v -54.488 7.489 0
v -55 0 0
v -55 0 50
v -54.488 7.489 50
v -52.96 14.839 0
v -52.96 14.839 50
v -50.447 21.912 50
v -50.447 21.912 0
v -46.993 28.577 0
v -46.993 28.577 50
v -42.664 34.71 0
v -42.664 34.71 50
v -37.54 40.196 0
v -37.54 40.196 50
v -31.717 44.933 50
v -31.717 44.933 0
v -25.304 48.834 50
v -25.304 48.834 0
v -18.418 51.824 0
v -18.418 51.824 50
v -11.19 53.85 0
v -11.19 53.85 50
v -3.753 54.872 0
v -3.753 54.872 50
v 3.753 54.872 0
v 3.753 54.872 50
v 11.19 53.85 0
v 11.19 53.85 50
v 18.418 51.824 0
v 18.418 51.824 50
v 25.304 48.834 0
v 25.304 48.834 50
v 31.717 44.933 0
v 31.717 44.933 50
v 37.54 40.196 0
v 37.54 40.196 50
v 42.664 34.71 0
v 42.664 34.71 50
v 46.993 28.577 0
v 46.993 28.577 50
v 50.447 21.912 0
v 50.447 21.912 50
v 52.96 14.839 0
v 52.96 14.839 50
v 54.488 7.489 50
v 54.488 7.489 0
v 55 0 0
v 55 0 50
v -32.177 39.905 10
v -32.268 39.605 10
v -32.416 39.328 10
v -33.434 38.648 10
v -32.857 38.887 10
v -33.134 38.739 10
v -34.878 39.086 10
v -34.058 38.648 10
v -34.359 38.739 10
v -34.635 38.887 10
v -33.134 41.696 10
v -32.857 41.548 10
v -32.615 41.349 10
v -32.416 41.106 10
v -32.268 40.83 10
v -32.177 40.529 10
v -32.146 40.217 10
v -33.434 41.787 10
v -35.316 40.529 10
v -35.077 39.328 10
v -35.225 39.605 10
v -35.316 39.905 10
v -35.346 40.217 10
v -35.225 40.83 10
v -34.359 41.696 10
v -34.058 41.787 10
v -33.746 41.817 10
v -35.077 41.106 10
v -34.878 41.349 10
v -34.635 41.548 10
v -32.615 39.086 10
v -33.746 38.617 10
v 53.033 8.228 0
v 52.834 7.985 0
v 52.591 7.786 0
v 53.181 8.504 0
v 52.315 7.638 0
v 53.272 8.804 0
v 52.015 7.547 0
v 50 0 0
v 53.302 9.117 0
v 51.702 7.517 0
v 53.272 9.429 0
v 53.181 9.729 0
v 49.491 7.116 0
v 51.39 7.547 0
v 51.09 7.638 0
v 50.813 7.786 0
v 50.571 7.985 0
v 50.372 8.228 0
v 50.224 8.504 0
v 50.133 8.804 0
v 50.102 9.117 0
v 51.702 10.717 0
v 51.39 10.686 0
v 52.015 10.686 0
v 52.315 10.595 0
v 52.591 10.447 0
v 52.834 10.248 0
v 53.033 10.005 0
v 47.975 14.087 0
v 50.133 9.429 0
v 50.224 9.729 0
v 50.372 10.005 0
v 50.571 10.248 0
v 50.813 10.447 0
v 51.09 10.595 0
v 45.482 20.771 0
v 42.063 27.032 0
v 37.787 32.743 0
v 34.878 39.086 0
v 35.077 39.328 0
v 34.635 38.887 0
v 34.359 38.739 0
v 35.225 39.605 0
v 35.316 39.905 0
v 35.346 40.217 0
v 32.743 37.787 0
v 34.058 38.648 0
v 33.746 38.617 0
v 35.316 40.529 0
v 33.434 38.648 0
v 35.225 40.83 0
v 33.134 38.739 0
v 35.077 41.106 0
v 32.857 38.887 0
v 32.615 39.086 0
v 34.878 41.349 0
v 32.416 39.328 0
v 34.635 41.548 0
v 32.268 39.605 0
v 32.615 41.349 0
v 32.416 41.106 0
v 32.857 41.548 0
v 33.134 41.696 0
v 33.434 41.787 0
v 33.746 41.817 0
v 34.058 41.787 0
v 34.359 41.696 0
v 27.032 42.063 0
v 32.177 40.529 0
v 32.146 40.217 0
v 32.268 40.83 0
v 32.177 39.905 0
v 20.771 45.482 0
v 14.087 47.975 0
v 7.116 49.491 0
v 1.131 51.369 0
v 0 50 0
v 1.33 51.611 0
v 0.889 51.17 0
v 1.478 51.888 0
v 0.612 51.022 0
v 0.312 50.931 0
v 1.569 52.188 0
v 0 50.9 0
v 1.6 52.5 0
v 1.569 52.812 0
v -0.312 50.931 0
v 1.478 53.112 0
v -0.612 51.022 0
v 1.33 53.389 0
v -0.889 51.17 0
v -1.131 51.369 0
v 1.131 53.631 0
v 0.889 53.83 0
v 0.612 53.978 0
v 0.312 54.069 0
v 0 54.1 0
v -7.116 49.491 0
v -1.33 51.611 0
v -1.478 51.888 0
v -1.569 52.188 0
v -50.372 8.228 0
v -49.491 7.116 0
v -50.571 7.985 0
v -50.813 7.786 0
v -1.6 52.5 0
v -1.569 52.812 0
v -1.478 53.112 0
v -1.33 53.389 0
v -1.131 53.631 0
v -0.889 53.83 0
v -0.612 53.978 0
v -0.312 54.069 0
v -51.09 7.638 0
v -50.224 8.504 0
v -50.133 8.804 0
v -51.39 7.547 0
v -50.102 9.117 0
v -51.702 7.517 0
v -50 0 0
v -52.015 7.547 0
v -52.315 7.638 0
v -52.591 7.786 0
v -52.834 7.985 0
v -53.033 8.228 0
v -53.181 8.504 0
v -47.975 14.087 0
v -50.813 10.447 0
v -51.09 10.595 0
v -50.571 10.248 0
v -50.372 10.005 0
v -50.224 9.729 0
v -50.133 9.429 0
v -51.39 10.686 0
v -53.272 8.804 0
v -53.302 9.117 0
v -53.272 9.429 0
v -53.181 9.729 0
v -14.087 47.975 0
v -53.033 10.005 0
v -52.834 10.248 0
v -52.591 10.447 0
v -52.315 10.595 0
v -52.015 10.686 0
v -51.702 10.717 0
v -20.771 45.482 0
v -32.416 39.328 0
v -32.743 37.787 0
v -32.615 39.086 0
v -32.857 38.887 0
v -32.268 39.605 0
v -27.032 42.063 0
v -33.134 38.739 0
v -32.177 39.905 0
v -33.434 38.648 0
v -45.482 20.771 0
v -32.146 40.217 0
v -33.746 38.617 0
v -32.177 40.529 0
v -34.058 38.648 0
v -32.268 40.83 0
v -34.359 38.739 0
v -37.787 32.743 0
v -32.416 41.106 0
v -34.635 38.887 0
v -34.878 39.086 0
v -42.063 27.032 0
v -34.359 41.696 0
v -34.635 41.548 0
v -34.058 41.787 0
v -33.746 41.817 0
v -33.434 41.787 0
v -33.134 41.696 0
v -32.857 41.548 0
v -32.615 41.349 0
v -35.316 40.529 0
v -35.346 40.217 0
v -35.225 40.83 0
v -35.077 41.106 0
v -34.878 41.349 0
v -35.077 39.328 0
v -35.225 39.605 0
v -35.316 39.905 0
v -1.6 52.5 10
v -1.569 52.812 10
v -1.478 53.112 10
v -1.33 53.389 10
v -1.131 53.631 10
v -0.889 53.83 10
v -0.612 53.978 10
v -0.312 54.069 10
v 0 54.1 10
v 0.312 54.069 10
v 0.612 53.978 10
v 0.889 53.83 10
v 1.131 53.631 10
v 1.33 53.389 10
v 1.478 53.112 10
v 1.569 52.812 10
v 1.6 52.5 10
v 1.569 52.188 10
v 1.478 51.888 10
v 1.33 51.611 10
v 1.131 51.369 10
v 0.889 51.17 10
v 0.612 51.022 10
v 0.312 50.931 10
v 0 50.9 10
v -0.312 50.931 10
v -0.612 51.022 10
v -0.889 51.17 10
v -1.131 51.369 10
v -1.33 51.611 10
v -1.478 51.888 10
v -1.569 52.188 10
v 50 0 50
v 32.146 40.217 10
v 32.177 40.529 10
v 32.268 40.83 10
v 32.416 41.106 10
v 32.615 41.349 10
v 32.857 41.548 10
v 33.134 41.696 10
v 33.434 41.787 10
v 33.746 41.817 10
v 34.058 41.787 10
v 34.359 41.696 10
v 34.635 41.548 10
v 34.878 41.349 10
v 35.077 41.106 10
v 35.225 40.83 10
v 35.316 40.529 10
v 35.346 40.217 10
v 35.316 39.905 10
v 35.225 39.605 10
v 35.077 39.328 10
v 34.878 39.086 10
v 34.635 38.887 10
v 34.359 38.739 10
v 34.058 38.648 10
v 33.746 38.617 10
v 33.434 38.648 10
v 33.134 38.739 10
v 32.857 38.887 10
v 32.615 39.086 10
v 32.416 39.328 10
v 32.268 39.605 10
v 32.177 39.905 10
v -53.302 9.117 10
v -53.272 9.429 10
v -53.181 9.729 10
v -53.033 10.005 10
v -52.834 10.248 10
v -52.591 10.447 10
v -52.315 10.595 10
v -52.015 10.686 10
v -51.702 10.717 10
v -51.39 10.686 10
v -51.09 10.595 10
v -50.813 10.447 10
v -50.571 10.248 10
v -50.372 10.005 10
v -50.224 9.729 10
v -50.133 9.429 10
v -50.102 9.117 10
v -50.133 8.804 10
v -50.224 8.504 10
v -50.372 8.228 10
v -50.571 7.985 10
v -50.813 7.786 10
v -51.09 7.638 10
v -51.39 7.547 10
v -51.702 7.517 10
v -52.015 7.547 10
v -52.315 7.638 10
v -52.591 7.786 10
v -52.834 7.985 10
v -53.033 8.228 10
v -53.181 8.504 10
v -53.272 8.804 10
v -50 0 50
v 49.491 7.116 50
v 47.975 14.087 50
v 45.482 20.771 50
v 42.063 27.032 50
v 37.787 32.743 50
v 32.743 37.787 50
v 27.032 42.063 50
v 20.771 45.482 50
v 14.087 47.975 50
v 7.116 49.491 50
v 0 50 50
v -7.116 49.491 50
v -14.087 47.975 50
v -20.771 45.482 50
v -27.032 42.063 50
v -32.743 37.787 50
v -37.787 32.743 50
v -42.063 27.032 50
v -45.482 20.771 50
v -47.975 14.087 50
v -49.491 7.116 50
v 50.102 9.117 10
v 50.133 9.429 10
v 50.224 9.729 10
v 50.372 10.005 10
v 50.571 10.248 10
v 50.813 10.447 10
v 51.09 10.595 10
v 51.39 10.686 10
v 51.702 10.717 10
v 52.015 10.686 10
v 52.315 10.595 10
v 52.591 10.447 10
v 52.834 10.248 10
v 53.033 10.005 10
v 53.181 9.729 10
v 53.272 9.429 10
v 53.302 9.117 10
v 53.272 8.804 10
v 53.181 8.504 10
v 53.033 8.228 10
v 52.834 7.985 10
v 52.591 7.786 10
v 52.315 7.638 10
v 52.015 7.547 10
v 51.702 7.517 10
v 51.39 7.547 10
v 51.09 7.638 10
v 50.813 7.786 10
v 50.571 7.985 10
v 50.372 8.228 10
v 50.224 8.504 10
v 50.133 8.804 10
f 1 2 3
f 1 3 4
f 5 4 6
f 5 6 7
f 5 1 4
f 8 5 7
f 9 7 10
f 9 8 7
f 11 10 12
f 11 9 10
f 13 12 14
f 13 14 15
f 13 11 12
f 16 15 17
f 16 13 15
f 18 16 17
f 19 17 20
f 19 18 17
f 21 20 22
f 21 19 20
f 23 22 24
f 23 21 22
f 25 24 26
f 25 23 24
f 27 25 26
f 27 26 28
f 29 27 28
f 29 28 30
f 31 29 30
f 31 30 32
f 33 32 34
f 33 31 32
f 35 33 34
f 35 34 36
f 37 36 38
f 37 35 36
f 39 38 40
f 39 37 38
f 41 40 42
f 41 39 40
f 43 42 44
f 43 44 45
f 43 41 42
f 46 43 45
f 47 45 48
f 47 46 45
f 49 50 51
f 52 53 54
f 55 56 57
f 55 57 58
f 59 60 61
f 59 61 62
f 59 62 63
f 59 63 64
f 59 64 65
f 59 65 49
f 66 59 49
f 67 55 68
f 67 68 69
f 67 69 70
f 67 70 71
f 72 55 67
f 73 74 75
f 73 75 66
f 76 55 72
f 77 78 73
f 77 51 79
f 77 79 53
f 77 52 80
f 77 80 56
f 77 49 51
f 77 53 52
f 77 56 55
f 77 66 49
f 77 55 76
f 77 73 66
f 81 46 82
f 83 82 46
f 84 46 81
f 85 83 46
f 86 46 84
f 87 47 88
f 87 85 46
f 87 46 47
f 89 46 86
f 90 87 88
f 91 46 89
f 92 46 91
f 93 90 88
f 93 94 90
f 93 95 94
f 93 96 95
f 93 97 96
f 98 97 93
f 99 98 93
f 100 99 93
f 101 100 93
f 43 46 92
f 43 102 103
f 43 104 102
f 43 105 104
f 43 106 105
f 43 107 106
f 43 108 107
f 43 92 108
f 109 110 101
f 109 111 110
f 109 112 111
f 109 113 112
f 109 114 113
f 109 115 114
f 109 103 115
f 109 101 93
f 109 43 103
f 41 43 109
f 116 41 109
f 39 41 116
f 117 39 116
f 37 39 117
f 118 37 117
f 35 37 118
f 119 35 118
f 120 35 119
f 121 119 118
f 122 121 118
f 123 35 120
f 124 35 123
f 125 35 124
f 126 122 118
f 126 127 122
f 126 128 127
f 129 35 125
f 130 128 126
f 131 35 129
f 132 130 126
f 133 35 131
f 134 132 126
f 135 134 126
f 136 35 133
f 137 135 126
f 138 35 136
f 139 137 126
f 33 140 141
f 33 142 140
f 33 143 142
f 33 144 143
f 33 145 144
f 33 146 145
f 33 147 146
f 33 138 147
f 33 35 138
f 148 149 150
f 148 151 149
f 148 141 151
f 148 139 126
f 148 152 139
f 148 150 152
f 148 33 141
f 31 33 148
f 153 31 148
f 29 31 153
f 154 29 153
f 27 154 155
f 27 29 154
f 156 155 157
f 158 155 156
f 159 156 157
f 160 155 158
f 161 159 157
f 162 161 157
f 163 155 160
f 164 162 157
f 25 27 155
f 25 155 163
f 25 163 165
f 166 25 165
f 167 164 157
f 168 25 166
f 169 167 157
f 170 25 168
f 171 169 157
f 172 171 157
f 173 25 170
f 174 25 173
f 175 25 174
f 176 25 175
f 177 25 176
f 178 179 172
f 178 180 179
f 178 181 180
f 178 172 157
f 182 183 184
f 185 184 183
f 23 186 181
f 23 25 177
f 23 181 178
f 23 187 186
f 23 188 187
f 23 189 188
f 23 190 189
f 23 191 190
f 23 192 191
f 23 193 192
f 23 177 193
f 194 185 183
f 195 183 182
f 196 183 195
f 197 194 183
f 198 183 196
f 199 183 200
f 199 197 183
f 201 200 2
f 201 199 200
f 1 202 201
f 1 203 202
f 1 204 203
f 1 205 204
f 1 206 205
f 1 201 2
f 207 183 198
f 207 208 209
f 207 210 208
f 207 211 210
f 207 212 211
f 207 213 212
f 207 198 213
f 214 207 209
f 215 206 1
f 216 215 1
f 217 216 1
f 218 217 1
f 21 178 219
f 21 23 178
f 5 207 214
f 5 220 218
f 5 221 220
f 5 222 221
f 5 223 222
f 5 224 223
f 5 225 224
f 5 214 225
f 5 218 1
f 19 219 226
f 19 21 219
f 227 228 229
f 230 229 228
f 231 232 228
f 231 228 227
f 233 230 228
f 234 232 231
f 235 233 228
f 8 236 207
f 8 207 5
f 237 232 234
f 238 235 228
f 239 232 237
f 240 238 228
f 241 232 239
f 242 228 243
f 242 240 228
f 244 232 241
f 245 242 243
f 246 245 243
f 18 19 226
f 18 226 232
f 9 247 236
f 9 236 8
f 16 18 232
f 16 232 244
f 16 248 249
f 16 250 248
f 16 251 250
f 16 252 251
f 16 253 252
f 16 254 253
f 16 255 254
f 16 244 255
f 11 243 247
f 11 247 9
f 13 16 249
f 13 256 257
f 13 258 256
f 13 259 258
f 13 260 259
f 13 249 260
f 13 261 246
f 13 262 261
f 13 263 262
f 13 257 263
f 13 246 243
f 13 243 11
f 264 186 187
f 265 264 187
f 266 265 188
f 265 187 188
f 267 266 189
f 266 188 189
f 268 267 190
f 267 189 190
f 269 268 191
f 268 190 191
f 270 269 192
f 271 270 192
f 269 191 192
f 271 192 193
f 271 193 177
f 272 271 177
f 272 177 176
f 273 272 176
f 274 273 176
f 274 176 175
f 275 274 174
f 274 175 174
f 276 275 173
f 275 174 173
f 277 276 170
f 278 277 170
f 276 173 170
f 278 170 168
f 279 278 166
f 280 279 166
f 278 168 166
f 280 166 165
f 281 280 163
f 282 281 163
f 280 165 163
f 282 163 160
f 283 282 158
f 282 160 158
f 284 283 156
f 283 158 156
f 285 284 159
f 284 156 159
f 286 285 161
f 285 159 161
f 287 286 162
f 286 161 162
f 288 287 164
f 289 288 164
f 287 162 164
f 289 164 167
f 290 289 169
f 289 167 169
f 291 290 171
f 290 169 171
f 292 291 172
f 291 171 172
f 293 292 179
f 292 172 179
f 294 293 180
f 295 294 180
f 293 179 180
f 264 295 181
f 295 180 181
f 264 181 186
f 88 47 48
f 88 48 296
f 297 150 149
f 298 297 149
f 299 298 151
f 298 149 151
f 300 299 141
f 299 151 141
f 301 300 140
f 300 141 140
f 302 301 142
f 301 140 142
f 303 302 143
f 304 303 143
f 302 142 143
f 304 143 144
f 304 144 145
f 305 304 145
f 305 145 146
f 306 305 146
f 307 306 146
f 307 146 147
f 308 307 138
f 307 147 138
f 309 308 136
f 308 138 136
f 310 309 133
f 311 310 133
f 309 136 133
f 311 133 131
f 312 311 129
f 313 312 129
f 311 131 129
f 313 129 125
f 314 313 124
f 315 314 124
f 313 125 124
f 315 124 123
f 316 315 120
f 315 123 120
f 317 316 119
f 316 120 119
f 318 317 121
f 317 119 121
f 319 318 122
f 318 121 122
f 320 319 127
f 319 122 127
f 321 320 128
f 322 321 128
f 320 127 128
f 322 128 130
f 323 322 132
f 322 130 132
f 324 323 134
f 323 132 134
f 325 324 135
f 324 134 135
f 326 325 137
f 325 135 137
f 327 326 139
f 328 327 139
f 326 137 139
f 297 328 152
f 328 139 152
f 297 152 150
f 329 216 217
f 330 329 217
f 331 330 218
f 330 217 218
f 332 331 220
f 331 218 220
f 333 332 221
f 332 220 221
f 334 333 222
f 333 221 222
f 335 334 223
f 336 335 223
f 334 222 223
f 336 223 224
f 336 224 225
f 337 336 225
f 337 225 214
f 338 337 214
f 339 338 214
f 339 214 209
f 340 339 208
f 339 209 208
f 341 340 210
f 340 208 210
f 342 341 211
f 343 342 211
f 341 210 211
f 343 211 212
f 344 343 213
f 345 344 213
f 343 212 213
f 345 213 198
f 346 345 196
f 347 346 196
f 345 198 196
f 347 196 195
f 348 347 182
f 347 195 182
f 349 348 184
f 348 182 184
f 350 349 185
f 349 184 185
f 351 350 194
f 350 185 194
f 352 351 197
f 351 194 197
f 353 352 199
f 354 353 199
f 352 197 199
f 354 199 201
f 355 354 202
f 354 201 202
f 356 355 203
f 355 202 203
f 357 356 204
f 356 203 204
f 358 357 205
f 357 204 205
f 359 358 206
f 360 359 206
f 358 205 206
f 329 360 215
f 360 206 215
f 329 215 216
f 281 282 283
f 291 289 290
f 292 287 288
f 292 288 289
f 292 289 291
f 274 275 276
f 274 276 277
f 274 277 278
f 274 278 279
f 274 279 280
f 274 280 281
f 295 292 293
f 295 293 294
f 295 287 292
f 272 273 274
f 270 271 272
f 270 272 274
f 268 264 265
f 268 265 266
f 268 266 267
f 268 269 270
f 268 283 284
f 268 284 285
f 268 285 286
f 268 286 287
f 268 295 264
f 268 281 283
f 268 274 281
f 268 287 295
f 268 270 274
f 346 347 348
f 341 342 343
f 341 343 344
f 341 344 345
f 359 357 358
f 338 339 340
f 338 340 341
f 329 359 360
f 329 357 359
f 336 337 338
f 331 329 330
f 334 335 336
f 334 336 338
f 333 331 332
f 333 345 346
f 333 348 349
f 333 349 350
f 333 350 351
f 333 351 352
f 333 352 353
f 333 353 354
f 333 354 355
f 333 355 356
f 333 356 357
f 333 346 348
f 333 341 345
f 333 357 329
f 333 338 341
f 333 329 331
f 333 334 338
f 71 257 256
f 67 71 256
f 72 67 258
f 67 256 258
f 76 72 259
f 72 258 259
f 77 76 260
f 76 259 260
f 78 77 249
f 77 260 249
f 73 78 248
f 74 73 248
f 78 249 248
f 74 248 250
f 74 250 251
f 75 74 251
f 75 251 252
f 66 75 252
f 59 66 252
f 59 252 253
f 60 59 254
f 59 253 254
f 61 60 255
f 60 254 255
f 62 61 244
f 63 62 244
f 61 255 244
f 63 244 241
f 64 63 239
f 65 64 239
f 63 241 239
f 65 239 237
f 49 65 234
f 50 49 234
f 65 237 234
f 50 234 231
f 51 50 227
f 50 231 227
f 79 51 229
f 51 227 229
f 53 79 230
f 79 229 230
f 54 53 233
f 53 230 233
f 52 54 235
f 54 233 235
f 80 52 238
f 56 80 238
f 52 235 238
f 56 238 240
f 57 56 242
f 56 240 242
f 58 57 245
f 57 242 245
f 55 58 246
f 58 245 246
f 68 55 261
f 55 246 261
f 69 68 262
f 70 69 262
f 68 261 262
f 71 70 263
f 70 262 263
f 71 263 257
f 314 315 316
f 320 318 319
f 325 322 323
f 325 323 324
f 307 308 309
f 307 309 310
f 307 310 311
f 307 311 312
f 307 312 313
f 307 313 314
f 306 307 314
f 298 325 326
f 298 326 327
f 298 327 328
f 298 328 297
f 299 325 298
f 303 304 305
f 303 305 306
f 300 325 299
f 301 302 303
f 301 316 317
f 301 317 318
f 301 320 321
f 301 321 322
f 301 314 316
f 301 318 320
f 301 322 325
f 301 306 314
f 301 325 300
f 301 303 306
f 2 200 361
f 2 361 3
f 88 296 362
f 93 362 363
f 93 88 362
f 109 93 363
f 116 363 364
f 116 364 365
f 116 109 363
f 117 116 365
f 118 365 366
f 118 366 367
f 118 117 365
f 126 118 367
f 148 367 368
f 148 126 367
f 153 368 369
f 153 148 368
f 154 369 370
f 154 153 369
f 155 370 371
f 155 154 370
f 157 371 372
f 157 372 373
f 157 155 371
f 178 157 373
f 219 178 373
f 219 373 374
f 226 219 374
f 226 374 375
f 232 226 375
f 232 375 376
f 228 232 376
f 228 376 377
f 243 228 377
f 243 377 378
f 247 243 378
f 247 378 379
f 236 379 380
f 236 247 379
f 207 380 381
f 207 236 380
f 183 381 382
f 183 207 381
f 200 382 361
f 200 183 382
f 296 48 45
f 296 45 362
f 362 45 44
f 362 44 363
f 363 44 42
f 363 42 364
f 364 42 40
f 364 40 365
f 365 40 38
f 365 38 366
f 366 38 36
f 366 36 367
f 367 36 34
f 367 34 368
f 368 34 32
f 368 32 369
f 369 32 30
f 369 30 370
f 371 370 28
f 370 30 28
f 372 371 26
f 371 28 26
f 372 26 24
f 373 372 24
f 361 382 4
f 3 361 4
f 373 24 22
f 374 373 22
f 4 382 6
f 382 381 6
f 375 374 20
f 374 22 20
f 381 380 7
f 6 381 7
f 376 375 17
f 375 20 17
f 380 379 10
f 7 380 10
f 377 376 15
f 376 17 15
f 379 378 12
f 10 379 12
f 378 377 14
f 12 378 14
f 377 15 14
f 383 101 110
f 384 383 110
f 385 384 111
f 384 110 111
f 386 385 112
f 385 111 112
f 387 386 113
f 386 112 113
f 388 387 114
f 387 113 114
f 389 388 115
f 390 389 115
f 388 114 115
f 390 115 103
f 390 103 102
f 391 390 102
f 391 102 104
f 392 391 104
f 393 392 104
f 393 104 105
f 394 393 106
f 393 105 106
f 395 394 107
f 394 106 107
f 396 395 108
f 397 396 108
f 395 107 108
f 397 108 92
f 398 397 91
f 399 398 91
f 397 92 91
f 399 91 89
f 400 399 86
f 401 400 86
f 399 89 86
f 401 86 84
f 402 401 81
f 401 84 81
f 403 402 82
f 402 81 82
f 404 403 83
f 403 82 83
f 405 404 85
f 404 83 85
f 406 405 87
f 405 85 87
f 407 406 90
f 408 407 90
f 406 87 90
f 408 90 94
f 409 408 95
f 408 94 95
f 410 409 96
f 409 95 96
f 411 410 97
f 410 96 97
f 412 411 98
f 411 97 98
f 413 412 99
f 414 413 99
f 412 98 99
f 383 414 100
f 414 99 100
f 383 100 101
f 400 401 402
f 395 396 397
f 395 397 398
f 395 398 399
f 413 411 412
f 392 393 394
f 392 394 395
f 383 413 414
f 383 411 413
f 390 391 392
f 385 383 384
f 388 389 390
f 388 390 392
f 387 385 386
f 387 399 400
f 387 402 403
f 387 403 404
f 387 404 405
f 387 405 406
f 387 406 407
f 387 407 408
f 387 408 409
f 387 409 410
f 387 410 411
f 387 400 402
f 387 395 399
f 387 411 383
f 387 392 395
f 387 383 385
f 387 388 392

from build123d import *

# Parameters (mm, degrees)
BOSS_EXTRUDE1_DEPTH = 50
SKETCH2_R           = 1.6
CUT_EXTRUDE1_DEPTH  = 10


with BuildPart() as part:
    # Sketch1 → Boss-Extrude1 (new body)
    with BuildSketch(Plane.XY):
        with BuildLine():
            Line((55, 0), (50, 0))
            ThreePointArc((50, 0), (0, 50), (-50, 0))
            Line((-50, 0), (-55, 0))
            ThreePointArc((-55, 0), (0, 55), (55, 0))
        make_face()
    extrude(amount=BOSS_EXTRUDE1_DEPTH)

    # Sketch2 → Cut-Extrude1 (cut)
    with BuildSketch(Plane(origin=(0, 0, 0), x_dir=(-1, 0, 0), z_dir=(0, 0, -1))):
        with Locations((0, 52.5)):
            Circle(SKETCH2_R)
        with Locations((33.746349509, 40.217333264)):
            Circle(SKETCH2_R)
        with Locations((51.702407033, 9.116529328)):
            Circle(SKETCH2_R)
        with Locations((-51.702407033, 9.116529328)):
            Circle(SKETCH2_R)
        with Locations((-33.746349509, 40.217333264)):
            Circle(SKETCH2_R)
    extrude(amount=-CUT_EXTRUDE1_DEPTH, mode=Mode.SUBTRACT)


solid = part.part
